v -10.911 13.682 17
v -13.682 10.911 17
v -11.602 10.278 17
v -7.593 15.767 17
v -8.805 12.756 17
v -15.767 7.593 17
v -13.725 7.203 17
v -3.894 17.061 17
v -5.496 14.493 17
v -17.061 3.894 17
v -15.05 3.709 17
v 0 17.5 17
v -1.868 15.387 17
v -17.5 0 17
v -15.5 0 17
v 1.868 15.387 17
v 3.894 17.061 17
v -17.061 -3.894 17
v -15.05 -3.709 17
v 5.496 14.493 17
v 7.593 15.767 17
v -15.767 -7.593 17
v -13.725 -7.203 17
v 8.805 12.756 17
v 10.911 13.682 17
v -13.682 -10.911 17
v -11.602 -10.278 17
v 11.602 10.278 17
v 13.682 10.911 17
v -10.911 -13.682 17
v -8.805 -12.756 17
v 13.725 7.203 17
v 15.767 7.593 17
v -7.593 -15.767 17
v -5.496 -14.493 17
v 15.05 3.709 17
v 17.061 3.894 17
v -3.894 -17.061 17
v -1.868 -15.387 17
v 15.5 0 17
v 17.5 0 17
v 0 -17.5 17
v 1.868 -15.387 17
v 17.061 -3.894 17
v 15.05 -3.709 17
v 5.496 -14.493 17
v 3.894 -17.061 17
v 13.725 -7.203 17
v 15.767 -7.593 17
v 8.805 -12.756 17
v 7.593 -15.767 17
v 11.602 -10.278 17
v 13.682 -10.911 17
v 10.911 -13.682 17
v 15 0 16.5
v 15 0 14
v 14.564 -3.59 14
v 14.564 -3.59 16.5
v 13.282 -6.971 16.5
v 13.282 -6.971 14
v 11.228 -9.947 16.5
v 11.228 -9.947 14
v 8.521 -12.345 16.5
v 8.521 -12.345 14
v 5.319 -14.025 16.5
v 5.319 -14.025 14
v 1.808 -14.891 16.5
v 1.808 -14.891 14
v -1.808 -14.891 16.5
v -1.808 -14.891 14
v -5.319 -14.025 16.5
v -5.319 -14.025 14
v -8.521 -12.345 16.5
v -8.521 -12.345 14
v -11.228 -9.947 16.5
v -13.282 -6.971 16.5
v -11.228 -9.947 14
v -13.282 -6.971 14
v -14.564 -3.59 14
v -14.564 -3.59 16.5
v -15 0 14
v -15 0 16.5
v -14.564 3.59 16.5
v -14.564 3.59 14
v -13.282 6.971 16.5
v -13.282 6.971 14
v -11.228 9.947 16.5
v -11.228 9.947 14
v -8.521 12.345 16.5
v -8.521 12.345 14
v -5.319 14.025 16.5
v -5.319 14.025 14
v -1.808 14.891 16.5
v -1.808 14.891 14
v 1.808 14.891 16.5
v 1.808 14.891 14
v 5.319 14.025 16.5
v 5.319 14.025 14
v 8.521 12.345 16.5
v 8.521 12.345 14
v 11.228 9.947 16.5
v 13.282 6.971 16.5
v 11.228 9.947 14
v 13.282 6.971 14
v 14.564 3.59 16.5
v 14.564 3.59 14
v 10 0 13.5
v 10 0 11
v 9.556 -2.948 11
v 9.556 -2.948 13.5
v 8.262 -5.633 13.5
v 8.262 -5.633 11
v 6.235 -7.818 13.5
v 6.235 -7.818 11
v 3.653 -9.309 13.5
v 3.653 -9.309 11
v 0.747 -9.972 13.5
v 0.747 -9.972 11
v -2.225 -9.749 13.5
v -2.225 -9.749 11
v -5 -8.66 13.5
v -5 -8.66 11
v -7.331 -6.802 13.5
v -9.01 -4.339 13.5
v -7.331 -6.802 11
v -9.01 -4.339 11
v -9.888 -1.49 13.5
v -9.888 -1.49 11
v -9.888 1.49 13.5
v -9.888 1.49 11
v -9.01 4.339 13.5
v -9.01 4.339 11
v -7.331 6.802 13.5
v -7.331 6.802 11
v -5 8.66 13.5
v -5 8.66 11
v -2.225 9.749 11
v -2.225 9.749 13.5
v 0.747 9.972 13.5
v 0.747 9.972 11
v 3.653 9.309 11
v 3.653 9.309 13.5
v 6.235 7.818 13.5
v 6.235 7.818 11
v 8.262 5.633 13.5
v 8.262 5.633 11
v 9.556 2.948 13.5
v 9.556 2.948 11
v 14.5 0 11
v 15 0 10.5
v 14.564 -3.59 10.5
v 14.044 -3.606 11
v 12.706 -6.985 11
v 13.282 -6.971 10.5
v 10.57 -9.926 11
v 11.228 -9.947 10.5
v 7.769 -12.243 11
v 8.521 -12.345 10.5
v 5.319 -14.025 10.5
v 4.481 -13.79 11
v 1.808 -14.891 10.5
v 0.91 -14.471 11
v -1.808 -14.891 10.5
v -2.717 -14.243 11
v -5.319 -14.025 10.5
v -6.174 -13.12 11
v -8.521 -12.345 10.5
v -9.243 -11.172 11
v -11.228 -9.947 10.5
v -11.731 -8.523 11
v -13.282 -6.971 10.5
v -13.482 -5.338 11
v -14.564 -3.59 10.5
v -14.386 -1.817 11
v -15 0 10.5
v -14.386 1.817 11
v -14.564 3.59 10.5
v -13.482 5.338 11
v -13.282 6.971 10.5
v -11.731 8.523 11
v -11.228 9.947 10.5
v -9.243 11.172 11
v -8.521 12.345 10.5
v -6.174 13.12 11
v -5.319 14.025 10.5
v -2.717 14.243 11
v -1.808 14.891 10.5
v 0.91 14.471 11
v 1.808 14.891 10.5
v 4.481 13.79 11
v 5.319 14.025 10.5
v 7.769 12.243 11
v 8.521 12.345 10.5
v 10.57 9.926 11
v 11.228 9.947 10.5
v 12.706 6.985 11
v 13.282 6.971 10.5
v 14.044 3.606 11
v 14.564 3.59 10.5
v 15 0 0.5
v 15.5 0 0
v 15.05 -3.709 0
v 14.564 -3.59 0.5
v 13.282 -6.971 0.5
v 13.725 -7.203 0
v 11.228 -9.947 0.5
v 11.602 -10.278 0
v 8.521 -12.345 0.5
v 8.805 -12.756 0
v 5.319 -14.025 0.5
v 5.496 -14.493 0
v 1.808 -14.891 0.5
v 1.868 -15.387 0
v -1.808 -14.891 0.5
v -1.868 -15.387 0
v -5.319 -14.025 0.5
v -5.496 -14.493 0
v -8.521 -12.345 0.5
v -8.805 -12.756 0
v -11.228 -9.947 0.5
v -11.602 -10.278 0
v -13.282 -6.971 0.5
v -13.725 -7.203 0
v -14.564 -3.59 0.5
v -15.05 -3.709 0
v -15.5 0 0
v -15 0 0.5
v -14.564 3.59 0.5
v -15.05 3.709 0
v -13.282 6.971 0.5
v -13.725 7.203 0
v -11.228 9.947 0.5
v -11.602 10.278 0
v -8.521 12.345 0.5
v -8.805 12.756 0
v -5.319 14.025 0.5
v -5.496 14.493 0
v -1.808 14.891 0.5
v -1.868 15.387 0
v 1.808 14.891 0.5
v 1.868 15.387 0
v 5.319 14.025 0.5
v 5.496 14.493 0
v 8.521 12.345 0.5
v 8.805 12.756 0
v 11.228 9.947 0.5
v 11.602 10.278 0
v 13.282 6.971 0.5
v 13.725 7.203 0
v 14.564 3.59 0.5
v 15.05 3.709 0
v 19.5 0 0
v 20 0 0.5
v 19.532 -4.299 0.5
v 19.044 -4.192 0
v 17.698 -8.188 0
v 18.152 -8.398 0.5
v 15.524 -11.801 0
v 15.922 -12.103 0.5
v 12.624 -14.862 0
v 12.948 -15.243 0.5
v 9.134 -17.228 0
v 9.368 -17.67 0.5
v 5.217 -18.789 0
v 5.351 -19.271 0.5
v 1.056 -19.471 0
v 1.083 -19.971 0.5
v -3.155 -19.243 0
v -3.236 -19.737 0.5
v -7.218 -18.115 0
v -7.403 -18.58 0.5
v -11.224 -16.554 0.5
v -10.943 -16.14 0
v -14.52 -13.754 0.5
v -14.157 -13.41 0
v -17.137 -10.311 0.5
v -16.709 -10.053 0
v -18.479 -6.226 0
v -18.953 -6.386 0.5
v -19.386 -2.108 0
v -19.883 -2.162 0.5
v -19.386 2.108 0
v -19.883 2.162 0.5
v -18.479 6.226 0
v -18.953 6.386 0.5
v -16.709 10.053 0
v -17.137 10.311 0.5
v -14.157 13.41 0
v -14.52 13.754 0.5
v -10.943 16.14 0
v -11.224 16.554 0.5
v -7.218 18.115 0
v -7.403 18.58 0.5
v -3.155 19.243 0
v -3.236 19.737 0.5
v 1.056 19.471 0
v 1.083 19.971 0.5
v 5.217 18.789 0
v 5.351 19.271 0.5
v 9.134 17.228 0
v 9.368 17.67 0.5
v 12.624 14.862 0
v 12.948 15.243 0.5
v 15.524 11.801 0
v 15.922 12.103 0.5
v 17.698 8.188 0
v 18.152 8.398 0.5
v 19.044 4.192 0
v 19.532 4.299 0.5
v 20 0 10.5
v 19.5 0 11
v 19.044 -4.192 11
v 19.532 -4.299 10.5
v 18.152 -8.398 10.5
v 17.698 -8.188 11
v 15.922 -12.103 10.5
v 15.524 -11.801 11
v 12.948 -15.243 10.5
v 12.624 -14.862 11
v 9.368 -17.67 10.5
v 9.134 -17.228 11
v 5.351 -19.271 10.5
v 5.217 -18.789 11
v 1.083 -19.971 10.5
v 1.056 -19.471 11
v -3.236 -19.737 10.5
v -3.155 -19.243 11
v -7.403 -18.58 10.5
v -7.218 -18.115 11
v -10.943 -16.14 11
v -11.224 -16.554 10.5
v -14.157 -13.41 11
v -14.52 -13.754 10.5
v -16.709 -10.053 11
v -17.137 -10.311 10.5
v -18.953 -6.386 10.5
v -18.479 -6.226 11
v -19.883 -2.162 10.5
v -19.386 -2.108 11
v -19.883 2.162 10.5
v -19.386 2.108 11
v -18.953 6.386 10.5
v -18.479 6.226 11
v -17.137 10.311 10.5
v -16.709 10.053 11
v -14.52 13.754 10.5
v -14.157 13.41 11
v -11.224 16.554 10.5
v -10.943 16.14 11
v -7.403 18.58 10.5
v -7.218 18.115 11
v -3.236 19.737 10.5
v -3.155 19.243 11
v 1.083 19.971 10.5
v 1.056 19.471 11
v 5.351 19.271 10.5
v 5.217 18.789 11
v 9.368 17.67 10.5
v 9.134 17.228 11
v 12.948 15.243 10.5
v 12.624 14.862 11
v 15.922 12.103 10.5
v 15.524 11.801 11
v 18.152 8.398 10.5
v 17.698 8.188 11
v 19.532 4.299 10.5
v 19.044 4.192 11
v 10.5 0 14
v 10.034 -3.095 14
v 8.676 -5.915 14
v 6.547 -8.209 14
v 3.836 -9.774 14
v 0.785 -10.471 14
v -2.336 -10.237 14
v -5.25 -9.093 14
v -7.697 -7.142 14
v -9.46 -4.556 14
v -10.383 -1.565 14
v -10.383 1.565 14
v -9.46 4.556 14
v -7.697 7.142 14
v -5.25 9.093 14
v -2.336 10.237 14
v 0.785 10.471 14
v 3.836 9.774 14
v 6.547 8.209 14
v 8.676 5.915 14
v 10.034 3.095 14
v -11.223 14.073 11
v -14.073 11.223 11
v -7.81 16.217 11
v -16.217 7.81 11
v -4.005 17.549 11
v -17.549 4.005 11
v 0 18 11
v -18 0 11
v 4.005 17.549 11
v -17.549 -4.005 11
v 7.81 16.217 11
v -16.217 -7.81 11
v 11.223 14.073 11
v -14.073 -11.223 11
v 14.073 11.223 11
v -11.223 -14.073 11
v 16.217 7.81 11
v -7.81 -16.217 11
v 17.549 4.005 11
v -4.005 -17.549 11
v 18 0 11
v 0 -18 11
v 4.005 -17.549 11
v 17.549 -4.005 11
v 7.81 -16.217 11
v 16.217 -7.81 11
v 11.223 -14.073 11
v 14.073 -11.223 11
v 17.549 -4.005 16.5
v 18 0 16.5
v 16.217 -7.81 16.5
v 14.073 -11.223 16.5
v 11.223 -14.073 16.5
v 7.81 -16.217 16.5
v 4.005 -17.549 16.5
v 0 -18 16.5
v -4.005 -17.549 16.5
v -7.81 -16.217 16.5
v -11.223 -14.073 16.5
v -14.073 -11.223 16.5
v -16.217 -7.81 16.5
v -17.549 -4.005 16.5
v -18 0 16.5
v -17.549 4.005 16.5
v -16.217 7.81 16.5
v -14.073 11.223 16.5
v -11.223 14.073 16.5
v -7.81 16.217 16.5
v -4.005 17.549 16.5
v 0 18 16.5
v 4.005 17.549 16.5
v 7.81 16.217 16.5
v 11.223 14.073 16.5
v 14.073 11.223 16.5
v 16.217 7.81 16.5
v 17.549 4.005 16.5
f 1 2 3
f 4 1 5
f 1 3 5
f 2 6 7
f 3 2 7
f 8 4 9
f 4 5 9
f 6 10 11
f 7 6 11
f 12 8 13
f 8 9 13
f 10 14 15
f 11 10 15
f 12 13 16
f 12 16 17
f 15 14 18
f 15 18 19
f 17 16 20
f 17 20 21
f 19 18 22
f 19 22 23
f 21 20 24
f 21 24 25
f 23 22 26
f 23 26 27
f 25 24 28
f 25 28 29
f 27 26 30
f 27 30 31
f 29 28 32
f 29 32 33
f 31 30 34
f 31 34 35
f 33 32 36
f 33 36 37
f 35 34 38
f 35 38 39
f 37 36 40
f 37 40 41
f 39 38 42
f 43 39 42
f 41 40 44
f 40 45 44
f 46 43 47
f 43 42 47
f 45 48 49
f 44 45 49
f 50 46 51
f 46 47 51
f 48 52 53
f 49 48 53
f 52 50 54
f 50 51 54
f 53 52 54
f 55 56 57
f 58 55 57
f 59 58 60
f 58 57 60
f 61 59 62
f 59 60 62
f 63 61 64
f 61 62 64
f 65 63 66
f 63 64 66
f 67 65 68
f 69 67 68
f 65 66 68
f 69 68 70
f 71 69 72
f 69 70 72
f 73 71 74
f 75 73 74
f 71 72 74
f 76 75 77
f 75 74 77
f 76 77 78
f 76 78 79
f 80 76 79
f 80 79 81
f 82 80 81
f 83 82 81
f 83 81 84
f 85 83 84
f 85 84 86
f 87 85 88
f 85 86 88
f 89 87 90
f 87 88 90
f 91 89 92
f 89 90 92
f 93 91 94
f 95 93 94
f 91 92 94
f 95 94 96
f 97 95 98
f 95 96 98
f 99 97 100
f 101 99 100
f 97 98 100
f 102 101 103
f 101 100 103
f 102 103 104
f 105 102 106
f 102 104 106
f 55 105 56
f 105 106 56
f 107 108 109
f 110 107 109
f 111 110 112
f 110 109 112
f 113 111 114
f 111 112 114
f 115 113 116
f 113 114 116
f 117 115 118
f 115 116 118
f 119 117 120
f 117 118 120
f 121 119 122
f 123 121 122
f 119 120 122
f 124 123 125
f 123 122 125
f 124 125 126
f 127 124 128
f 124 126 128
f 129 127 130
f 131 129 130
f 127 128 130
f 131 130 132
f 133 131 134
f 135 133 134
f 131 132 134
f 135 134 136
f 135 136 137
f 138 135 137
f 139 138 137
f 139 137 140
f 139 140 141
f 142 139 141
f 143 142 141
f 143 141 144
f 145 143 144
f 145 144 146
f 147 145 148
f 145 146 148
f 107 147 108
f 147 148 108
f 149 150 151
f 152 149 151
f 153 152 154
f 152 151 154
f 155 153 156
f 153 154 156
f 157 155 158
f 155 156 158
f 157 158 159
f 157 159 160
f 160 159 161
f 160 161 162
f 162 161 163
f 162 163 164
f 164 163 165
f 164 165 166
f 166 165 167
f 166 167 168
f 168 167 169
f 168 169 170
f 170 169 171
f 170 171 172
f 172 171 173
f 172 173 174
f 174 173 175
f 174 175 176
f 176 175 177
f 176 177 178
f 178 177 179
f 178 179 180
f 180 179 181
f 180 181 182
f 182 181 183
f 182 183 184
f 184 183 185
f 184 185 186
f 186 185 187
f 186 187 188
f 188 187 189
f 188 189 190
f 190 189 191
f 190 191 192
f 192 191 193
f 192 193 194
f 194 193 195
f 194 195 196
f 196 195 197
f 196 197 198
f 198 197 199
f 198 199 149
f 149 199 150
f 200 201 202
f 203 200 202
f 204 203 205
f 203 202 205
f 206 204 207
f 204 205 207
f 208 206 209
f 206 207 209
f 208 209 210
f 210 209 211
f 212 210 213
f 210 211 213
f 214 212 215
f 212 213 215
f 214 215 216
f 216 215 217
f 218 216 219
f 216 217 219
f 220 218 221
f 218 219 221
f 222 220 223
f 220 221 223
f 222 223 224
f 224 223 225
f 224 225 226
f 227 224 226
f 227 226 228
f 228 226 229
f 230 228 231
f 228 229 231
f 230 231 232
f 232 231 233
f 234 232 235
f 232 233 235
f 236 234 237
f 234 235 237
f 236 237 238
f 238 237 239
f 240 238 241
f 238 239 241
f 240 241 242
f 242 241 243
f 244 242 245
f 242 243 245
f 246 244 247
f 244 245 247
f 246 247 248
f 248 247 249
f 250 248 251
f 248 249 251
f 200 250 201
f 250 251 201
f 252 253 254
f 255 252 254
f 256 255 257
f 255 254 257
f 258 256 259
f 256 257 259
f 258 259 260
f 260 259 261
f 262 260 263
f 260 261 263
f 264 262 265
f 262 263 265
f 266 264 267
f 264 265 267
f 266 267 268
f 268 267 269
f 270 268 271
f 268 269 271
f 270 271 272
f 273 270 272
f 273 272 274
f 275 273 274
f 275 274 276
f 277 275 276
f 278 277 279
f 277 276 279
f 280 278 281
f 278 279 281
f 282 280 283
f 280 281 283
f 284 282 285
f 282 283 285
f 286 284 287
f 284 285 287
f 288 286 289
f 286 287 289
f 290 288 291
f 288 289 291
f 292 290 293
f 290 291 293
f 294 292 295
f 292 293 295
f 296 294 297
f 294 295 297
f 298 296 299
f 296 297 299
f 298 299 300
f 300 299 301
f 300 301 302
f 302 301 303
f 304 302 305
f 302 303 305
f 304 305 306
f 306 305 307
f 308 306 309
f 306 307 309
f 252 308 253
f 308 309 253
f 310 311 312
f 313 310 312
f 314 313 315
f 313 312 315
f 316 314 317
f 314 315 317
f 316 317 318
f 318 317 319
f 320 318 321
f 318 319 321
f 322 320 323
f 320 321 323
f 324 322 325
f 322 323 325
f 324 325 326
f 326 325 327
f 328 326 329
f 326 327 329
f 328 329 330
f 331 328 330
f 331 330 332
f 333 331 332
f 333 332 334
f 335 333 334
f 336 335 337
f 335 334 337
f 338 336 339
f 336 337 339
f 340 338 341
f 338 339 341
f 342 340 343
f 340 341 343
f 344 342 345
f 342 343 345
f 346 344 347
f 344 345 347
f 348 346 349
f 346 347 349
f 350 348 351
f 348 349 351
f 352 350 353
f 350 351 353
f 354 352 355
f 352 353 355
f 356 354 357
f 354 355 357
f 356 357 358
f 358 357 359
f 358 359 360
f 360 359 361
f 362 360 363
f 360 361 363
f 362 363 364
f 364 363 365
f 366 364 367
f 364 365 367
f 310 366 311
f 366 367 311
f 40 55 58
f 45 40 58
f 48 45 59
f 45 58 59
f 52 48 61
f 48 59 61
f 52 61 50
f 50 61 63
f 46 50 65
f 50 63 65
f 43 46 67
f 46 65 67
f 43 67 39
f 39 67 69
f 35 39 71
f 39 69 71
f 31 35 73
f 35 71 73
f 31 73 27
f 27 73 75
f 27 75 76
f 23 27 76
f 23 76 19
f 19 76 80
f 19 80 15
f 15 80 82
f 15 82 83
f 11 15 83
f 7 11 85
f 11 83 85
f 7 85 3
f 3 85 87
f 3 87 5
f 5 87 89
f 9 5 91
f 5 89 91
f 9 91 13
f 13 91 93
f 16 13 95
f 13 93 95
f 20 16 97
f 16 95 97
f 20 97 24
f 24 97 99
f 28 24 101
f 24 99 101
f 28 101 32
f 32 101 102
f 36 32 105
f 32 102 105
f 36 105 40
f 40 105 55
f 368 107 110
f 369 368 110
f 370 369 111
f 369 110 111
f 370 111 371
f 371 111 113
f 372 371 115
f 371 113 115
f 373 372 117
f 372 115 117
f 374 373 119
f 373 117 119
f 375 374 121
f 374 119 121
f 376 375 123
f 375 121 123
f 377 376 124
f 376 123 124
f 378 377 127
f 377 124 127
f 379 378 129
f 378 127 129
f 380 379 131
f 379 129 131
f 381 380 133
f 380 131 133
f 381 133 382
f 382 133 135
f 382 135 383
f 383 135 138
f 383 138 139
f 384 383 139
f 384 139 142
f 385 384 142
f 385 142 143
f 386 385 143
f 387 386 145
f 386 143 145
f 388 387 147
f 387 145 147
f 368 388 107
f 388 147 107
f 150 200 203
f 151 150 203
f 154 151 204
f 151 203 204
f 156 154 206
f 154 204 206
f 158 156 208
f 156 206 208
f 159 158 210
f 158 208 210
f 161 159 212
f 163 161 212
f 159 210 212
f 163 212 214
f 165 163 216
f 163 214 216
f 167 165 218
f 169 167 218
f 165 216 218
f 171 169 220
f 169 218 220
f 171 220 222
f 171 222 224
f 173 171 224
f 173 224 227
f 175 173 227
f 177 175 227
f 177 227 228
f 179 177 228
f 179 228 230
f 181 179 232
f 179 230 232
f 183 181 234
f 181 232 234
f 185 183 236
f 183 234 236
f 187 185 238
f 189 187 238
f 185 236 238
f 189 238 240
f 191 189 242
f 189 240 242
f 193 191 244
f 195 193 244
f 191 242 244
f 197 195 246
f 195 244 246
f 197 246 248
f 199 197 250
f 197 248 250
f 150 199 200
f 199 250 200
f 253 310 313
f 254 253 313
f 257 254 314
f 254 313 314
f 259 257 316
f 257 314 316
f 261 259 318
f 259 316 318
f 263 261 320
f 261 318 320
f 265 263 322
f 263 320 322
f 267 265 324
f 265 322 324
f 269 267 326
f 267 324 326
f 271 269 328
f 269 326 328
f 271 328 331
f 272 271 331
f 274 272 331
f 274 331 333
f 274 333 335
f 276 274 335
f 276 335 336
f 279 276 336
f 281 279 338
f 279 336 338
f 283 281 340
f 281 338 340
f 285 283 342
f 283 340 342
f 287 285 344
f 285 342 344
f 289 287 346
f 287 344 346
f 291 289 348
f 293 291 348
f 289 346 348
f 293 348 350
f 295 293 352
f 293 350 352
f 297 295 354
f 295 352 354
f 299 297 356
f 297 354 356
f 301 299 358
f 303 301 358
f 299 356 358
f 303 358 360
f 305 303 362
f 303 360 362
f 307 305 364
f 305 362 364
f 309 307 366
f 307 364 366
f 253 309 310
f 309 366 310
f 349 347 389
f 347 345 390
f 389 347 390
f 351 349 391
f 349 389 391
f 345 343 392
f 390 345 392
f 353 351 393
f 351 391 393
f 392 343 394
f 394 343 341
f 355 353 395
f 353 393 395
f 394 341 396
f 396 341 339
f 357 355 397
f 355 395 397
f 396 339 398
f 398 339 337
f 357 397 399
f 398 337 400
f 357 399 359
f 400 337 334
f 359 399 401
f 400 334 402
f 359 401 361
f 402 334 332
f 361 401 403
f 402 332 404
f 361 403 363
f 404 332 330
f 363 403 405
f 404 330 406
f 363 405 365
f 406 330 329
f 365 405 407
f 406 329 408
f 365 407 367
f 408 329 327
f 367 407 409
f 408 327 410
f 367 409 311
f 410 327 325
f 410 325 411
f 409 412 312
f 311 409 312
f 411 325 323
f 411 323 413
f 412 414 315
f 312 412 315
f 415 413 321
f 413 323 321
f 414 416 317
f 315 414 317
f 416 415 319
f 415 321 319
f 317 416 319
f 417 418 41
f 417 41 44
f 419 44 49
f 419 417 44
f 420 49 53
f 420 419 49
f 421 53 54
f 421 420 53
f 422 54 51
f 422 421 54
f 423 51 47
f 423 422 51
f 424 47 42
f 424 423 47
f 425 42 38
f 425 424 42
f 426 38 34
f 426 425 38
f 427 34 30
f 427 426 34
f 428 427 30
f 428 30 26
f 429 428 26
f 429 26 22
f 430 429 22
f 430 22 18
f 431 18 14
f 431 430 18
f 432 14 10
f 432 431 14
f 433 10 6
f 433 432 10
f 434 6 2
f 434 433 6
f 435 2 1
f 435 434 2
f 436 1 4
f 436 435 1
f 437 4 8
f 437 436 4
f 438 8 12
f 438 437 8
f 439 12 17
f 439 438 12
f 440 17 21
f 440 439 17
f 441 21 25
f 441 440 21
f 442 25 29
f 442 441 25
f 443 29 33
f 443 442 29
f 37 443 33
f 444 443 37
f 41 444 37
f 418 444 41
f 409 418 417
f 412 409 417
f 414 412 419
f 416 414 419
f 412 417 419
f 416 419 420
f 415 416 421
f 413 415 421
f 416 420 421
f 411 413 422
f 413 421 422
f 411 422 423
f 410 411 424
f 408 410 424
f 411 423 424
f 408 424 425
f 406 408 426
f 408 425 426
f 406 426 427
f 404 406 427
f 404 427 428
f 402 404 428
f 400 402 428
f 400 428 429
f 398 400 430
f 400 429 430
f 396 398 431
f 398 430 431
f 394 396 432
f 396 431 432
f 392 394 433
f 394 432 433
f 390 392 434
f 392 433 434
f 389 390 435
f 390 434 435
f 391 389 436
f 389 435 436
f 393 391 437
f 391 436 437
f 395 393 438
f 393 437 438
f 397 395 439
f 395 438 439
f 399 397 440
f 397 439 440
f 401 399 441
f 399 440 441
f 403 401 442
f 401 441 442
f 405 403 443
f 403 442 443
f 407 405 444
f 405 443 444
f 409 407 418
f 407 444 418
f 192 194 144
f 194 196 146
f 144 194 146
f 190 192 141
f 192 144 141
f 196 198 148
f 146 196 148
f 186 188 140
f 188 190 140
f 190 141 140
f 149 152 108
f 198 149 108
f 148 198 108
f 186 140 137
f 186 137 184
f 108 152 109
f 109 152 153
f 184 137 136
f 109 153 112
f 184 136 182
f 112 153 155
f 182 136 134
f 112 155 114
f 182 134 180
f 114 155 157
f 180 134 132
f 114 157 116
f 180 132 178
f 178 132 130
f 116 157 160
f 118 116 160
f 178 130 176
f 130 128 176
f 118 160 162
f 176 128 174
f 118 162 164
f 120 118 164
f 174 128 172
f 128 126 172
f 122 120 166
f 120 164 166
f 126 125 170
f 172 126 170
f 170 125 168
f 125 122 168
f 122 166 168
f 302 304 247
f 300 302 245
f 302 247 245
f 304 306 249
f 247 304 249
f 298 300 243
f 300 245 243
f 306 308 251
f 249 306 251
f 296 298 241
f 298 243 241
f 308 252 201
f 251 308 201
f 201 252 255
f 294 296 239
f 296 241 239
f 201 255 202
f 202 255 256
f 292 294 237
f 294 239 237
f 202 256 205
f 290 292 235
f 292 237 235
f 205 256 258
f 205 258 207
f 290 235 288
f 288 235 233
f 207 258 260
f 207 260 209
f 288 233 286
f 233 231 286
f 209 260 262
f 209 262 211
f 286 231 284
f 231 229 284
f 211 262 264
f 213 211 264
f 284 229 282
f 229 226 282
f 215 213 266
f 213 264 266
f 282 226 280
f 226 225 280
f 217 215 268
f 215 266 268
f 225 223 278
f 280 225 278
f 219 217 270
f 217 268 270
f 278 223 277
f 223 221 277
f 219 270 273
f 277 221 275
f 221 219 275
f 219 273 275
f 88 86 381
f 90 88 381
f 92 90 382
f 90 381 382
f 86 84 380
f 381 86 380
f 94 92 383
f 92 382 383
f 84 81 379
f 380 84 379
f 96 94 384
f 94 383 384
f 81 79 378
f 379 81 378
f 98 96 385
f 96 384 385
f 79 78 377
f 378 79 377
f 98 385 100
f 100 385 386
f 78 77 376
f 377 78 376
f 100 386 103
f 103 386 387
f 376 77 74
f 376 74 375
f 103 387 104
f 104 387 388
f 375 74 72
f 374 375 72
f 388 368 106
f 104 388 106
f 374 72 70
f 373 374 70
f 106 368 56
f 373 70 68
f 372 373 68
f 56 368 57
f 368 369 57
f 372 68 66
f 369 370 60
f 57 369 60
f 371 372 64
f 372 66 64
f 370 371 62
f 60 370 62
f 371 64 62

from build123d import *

# Parameters (mm, degrees)
F2_SIZE2 = 0.5
F2_SIZE  = 0.5


with BuildPart() as f1:
    # F0 (on Front) → F1 (revolve)
    with BuildSketch(Plane.XZ):
        Polygon((18, 17), (15, 17), (15, 14), (10, 14), (10, 11), (15, 11), (15, 0), (20, 0), (20, 11), (18, 11), align=None)
    revolve(axis=Axis((0, 0, 8.282995), (0, 0, -1)))

    # F2
    f2_edges = [f1.edges().sort_by_distance(p)[0] for p in [
        (-15, 0, 17),
        (-10, 0, 14),
        (-15, 0, 11),
        (-15, 0, 0),
        (-20, 0, 11),
        (-18, 0, 17),
        (-20, 0, 0),
    ]]
    chamfer(f2_edges, length=F2_SIZE, length2=F2_SIZE2)


solid = f1.part
